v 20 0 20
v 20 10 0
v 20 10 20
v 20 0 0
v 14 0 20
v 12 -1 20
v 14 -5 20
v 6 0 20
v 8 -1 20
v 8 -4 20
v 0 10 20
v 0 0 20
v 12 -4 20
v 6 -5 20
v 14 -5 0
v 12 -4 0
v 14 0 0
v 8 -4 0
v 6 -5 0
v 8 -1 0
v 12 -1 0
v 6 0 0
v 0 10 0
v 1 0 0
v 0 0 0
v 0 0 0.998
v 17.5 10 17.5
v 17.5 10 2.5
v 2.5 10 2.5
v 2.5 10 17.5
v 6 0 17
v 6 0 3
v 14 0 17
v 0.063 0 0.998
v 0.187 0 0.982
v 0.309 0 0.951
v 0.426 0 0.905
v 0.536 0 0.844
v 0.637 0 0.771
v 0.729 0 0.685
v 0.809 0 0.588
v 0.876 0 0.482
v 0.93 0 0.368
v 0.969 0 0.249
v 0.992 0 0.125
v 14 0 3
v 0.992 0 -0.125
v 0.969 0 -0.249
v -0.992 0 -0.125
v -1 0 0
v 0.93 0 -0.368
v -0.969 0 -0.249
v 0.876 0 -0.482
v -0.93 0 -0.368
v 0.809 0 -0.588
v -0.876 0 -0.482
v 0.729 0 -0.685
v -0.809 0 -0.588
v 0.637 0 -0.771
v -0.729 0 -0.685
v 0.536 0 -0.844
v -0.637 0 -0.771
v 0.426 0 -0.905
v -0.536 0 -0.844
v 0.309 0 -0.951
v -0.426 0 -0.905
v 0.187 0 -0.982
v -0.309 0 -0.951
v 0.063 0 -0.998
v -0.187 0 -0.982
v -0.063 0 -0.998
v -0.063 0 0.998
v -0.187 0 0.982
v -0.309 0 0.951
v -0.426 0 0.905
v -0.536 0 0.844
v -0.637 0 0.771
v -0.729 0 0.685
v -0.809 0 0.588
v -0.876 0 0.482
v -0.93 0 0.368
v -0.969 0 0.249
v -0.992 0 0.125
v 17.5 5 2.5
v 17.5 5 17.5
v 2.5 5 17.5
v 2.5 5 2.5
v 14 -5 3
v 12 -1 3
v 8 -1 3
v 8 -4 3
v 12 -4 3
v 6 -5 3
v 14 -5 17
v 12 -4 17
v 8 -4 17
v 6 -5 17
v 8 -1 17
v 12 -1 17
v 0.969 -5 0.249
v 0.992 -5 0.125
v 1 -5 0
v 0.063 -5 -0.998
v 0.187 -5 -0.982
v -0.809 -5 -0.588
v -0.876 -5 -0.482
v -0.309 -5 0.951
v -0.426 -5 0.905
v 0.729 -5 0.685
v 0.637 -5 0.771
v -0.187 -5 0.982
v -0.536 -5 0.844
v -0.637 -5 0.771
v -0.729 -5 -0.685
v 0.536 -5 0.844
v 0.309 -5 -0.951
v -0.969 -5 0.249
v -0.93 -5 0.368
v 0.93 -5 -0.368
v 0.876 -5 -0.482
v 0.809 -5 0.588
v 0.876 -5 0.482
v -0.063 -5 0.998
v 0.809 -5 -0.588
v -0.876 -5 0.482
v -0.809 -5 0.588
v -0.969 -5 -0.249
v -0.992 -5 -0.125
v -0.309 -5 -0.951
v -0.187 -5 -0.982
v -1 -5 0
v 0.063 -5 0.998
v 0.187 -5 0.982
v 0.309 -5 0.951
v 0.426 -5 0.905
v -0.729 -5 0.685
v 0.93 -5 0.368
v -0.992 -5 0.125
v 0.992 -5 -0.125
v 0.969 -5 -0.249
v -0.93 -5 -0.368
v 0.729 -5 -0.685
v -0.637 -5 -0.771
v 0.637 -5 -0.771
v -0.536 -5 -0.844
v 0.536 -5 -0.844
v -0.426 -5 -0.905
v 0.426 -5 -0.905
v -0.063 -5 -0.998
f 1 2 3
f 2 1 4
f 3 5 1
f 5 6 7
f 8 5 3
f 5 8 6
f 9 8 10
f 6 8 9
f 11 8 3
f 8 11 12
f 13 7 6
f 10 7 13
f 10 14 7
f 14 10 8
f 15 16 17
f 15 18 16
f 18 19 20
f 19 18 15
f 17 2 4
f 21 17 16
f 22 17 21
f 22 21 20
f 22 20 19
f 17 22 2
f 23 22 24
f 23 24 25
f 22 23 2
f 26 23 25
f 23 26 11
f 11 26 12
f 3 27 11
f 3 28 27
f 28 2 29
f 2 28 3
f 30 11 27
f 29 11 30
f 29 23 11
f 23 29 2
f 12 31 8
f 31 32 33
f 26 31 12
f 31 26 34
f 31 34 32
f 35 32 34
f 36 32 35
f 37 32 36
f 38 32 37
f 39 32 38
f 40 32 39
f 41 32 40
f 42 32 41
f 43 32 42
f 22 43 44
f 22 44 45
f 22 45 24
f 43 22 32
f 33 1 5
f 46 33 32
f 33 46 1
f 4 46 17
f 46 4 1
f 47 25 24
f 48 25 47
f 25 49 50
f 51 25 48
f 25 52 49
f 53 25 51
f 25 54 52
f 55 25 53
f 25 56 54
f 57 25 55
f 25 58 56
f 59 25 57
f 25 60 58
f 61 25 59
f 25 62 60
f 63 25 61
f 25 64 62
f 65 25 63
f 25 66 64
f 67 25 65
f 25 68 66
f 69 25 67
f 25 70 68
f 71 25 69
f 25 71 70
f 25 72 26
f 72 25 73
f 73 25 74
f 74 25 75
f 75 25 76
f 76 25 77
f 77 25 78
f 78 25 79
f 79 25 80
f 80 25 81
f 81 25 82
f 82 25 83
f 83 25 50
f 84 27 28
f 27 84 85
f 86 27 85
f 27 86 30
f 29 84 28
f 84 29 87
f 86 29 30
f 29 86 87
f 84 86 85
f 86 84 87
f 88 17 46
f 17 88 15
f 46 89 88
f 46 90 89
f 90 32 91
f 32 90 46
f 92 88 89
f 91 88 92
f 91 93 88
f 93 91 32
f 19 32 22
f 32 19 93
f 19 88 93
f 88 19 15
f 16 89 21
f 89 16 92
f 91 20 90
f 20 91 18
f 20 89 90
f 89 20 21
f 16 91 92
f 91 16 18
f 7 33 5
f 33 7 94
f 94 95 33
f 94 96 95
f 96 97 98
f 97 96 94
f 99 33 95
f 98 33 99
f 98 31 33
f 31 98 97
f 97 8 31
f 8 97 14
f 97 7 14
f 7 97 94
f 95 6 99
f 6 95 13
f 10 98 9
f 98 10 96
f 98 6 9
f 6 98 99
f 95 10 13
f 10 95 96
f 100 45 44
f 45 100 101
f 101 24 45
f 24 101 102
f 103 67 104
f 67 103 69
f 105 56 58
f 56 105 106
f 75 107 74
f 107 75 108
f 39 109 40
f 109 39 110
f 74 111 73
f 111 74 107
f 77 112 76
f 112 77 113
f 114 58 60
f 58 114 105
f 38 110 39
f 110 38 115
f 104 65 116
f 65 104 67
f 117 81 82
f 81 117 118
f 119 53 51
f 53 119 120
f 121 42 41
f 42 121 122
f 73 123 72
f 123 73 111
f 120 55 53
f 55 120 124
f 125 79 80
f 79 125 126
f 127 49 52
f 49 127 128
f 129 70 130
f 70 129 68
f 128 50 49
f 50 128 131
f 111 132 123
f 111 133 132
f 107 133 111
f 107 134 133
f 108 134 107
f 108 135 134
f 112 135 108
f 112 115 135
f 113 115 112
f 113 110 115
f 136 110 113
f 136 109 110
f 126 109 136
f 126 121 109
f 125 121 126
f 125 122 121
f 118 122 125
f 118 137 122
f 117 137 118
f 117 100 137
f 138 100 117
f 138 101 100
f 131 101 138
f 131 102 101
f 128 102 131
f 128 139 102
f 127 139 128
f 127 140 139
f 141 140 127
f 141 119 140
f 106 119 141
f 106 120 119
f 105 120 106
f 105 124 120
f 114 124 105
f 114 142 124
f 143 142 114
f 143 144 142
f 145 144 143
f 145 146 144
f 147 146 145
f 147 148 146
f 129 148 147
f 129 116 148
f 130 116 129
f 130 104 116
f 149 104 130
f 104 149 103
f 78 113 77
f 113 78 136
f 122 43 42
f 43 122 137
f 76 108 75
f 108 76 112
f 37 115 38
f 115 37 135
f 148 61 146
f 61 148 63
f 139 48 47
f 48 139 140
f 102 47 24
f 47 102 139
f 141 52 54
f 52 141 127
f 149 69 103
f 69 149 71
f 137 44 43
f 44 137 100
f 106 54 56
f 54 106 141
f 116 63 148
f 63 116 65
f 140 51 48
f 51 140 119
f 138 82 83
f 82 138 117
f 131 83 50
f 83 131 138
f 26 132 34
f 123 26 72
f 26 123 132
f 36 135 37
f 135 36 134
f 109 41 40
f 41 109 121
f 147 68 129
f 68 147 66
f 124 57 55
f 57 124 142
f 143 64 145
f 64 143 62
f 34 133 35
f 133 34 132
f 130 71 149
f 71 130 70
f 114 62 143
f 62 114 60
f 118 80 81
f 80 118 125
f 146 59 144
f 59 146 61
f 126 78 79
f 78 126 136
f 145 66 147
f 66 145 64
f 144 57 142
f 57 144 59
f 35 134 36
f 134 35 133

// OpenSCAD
lamp_x = 20;
lamp_y = 10;
lamp_z = 20;

lamp_inside_x = (lamp_x - 5);
lamp_inside_y = (lamp_y - 5);
lamp_inside_z = (lamp_z - 5);

bracket_x = 8;
bracket_y = 5;
bracket_z = 3;
bracket_hole_x = 4;
bracket_hole_y = 3;
bracket_hole_z = 3;

//main body
module main_body(){
   cube([lamp_x,lamp_y,lamp_z]);}
module cube_inside(x,y,z,inside_x,inside_y,inside_z){
   lamp_pos_x = (x-inside_x)/2;
   lamp_pos_y = (y-inside_y);
   lamp_pos_z = (z-inside_z)/2;
   
   translate([lamp_pos_x,lamp_pos_y,lamp_pos_z]){
	  cube([inside_x,inside_y,inside_z]);}
   ;}   
module bracket(){
   difference(){
	  cube([bracket_x,bracket_y,bracket_z]);
	  translate([(bracket_x-bracket_hole_x)/2,(bracket_y-bracket_hole_y)/2,(bracket_z-bracket_hole_z)/2]){
		 cube([bracket_hole_x,bracket_hole_y,bracket_hole_z]);}
	  }
   }

module wire_hole(){
   rotate([90,0,0]){
	  cylinder(h=(lamp_y-lamp_inside_y), r=1, $fn=50);
	  }
   }

module main(){
   difference(){
	  //main body
	  #main_body();
	  //cube inside
	  cube_inside(lamp_x,lamp_y,lamp_z,lamp_inside_x,lamp_inside_y,lamp_inside_z);}
	  
   //bracket down
   translate([(lamp_x-bracket_x)/2,-bracket_y,0]){
	  bracket();}
   //bracket up
   translate([(lamp_x-bracket_x)/2,-bracket_y,lamp_z-bracket_z]){
		 bracket();}
	  
   
}



#main();
wire_hole();
